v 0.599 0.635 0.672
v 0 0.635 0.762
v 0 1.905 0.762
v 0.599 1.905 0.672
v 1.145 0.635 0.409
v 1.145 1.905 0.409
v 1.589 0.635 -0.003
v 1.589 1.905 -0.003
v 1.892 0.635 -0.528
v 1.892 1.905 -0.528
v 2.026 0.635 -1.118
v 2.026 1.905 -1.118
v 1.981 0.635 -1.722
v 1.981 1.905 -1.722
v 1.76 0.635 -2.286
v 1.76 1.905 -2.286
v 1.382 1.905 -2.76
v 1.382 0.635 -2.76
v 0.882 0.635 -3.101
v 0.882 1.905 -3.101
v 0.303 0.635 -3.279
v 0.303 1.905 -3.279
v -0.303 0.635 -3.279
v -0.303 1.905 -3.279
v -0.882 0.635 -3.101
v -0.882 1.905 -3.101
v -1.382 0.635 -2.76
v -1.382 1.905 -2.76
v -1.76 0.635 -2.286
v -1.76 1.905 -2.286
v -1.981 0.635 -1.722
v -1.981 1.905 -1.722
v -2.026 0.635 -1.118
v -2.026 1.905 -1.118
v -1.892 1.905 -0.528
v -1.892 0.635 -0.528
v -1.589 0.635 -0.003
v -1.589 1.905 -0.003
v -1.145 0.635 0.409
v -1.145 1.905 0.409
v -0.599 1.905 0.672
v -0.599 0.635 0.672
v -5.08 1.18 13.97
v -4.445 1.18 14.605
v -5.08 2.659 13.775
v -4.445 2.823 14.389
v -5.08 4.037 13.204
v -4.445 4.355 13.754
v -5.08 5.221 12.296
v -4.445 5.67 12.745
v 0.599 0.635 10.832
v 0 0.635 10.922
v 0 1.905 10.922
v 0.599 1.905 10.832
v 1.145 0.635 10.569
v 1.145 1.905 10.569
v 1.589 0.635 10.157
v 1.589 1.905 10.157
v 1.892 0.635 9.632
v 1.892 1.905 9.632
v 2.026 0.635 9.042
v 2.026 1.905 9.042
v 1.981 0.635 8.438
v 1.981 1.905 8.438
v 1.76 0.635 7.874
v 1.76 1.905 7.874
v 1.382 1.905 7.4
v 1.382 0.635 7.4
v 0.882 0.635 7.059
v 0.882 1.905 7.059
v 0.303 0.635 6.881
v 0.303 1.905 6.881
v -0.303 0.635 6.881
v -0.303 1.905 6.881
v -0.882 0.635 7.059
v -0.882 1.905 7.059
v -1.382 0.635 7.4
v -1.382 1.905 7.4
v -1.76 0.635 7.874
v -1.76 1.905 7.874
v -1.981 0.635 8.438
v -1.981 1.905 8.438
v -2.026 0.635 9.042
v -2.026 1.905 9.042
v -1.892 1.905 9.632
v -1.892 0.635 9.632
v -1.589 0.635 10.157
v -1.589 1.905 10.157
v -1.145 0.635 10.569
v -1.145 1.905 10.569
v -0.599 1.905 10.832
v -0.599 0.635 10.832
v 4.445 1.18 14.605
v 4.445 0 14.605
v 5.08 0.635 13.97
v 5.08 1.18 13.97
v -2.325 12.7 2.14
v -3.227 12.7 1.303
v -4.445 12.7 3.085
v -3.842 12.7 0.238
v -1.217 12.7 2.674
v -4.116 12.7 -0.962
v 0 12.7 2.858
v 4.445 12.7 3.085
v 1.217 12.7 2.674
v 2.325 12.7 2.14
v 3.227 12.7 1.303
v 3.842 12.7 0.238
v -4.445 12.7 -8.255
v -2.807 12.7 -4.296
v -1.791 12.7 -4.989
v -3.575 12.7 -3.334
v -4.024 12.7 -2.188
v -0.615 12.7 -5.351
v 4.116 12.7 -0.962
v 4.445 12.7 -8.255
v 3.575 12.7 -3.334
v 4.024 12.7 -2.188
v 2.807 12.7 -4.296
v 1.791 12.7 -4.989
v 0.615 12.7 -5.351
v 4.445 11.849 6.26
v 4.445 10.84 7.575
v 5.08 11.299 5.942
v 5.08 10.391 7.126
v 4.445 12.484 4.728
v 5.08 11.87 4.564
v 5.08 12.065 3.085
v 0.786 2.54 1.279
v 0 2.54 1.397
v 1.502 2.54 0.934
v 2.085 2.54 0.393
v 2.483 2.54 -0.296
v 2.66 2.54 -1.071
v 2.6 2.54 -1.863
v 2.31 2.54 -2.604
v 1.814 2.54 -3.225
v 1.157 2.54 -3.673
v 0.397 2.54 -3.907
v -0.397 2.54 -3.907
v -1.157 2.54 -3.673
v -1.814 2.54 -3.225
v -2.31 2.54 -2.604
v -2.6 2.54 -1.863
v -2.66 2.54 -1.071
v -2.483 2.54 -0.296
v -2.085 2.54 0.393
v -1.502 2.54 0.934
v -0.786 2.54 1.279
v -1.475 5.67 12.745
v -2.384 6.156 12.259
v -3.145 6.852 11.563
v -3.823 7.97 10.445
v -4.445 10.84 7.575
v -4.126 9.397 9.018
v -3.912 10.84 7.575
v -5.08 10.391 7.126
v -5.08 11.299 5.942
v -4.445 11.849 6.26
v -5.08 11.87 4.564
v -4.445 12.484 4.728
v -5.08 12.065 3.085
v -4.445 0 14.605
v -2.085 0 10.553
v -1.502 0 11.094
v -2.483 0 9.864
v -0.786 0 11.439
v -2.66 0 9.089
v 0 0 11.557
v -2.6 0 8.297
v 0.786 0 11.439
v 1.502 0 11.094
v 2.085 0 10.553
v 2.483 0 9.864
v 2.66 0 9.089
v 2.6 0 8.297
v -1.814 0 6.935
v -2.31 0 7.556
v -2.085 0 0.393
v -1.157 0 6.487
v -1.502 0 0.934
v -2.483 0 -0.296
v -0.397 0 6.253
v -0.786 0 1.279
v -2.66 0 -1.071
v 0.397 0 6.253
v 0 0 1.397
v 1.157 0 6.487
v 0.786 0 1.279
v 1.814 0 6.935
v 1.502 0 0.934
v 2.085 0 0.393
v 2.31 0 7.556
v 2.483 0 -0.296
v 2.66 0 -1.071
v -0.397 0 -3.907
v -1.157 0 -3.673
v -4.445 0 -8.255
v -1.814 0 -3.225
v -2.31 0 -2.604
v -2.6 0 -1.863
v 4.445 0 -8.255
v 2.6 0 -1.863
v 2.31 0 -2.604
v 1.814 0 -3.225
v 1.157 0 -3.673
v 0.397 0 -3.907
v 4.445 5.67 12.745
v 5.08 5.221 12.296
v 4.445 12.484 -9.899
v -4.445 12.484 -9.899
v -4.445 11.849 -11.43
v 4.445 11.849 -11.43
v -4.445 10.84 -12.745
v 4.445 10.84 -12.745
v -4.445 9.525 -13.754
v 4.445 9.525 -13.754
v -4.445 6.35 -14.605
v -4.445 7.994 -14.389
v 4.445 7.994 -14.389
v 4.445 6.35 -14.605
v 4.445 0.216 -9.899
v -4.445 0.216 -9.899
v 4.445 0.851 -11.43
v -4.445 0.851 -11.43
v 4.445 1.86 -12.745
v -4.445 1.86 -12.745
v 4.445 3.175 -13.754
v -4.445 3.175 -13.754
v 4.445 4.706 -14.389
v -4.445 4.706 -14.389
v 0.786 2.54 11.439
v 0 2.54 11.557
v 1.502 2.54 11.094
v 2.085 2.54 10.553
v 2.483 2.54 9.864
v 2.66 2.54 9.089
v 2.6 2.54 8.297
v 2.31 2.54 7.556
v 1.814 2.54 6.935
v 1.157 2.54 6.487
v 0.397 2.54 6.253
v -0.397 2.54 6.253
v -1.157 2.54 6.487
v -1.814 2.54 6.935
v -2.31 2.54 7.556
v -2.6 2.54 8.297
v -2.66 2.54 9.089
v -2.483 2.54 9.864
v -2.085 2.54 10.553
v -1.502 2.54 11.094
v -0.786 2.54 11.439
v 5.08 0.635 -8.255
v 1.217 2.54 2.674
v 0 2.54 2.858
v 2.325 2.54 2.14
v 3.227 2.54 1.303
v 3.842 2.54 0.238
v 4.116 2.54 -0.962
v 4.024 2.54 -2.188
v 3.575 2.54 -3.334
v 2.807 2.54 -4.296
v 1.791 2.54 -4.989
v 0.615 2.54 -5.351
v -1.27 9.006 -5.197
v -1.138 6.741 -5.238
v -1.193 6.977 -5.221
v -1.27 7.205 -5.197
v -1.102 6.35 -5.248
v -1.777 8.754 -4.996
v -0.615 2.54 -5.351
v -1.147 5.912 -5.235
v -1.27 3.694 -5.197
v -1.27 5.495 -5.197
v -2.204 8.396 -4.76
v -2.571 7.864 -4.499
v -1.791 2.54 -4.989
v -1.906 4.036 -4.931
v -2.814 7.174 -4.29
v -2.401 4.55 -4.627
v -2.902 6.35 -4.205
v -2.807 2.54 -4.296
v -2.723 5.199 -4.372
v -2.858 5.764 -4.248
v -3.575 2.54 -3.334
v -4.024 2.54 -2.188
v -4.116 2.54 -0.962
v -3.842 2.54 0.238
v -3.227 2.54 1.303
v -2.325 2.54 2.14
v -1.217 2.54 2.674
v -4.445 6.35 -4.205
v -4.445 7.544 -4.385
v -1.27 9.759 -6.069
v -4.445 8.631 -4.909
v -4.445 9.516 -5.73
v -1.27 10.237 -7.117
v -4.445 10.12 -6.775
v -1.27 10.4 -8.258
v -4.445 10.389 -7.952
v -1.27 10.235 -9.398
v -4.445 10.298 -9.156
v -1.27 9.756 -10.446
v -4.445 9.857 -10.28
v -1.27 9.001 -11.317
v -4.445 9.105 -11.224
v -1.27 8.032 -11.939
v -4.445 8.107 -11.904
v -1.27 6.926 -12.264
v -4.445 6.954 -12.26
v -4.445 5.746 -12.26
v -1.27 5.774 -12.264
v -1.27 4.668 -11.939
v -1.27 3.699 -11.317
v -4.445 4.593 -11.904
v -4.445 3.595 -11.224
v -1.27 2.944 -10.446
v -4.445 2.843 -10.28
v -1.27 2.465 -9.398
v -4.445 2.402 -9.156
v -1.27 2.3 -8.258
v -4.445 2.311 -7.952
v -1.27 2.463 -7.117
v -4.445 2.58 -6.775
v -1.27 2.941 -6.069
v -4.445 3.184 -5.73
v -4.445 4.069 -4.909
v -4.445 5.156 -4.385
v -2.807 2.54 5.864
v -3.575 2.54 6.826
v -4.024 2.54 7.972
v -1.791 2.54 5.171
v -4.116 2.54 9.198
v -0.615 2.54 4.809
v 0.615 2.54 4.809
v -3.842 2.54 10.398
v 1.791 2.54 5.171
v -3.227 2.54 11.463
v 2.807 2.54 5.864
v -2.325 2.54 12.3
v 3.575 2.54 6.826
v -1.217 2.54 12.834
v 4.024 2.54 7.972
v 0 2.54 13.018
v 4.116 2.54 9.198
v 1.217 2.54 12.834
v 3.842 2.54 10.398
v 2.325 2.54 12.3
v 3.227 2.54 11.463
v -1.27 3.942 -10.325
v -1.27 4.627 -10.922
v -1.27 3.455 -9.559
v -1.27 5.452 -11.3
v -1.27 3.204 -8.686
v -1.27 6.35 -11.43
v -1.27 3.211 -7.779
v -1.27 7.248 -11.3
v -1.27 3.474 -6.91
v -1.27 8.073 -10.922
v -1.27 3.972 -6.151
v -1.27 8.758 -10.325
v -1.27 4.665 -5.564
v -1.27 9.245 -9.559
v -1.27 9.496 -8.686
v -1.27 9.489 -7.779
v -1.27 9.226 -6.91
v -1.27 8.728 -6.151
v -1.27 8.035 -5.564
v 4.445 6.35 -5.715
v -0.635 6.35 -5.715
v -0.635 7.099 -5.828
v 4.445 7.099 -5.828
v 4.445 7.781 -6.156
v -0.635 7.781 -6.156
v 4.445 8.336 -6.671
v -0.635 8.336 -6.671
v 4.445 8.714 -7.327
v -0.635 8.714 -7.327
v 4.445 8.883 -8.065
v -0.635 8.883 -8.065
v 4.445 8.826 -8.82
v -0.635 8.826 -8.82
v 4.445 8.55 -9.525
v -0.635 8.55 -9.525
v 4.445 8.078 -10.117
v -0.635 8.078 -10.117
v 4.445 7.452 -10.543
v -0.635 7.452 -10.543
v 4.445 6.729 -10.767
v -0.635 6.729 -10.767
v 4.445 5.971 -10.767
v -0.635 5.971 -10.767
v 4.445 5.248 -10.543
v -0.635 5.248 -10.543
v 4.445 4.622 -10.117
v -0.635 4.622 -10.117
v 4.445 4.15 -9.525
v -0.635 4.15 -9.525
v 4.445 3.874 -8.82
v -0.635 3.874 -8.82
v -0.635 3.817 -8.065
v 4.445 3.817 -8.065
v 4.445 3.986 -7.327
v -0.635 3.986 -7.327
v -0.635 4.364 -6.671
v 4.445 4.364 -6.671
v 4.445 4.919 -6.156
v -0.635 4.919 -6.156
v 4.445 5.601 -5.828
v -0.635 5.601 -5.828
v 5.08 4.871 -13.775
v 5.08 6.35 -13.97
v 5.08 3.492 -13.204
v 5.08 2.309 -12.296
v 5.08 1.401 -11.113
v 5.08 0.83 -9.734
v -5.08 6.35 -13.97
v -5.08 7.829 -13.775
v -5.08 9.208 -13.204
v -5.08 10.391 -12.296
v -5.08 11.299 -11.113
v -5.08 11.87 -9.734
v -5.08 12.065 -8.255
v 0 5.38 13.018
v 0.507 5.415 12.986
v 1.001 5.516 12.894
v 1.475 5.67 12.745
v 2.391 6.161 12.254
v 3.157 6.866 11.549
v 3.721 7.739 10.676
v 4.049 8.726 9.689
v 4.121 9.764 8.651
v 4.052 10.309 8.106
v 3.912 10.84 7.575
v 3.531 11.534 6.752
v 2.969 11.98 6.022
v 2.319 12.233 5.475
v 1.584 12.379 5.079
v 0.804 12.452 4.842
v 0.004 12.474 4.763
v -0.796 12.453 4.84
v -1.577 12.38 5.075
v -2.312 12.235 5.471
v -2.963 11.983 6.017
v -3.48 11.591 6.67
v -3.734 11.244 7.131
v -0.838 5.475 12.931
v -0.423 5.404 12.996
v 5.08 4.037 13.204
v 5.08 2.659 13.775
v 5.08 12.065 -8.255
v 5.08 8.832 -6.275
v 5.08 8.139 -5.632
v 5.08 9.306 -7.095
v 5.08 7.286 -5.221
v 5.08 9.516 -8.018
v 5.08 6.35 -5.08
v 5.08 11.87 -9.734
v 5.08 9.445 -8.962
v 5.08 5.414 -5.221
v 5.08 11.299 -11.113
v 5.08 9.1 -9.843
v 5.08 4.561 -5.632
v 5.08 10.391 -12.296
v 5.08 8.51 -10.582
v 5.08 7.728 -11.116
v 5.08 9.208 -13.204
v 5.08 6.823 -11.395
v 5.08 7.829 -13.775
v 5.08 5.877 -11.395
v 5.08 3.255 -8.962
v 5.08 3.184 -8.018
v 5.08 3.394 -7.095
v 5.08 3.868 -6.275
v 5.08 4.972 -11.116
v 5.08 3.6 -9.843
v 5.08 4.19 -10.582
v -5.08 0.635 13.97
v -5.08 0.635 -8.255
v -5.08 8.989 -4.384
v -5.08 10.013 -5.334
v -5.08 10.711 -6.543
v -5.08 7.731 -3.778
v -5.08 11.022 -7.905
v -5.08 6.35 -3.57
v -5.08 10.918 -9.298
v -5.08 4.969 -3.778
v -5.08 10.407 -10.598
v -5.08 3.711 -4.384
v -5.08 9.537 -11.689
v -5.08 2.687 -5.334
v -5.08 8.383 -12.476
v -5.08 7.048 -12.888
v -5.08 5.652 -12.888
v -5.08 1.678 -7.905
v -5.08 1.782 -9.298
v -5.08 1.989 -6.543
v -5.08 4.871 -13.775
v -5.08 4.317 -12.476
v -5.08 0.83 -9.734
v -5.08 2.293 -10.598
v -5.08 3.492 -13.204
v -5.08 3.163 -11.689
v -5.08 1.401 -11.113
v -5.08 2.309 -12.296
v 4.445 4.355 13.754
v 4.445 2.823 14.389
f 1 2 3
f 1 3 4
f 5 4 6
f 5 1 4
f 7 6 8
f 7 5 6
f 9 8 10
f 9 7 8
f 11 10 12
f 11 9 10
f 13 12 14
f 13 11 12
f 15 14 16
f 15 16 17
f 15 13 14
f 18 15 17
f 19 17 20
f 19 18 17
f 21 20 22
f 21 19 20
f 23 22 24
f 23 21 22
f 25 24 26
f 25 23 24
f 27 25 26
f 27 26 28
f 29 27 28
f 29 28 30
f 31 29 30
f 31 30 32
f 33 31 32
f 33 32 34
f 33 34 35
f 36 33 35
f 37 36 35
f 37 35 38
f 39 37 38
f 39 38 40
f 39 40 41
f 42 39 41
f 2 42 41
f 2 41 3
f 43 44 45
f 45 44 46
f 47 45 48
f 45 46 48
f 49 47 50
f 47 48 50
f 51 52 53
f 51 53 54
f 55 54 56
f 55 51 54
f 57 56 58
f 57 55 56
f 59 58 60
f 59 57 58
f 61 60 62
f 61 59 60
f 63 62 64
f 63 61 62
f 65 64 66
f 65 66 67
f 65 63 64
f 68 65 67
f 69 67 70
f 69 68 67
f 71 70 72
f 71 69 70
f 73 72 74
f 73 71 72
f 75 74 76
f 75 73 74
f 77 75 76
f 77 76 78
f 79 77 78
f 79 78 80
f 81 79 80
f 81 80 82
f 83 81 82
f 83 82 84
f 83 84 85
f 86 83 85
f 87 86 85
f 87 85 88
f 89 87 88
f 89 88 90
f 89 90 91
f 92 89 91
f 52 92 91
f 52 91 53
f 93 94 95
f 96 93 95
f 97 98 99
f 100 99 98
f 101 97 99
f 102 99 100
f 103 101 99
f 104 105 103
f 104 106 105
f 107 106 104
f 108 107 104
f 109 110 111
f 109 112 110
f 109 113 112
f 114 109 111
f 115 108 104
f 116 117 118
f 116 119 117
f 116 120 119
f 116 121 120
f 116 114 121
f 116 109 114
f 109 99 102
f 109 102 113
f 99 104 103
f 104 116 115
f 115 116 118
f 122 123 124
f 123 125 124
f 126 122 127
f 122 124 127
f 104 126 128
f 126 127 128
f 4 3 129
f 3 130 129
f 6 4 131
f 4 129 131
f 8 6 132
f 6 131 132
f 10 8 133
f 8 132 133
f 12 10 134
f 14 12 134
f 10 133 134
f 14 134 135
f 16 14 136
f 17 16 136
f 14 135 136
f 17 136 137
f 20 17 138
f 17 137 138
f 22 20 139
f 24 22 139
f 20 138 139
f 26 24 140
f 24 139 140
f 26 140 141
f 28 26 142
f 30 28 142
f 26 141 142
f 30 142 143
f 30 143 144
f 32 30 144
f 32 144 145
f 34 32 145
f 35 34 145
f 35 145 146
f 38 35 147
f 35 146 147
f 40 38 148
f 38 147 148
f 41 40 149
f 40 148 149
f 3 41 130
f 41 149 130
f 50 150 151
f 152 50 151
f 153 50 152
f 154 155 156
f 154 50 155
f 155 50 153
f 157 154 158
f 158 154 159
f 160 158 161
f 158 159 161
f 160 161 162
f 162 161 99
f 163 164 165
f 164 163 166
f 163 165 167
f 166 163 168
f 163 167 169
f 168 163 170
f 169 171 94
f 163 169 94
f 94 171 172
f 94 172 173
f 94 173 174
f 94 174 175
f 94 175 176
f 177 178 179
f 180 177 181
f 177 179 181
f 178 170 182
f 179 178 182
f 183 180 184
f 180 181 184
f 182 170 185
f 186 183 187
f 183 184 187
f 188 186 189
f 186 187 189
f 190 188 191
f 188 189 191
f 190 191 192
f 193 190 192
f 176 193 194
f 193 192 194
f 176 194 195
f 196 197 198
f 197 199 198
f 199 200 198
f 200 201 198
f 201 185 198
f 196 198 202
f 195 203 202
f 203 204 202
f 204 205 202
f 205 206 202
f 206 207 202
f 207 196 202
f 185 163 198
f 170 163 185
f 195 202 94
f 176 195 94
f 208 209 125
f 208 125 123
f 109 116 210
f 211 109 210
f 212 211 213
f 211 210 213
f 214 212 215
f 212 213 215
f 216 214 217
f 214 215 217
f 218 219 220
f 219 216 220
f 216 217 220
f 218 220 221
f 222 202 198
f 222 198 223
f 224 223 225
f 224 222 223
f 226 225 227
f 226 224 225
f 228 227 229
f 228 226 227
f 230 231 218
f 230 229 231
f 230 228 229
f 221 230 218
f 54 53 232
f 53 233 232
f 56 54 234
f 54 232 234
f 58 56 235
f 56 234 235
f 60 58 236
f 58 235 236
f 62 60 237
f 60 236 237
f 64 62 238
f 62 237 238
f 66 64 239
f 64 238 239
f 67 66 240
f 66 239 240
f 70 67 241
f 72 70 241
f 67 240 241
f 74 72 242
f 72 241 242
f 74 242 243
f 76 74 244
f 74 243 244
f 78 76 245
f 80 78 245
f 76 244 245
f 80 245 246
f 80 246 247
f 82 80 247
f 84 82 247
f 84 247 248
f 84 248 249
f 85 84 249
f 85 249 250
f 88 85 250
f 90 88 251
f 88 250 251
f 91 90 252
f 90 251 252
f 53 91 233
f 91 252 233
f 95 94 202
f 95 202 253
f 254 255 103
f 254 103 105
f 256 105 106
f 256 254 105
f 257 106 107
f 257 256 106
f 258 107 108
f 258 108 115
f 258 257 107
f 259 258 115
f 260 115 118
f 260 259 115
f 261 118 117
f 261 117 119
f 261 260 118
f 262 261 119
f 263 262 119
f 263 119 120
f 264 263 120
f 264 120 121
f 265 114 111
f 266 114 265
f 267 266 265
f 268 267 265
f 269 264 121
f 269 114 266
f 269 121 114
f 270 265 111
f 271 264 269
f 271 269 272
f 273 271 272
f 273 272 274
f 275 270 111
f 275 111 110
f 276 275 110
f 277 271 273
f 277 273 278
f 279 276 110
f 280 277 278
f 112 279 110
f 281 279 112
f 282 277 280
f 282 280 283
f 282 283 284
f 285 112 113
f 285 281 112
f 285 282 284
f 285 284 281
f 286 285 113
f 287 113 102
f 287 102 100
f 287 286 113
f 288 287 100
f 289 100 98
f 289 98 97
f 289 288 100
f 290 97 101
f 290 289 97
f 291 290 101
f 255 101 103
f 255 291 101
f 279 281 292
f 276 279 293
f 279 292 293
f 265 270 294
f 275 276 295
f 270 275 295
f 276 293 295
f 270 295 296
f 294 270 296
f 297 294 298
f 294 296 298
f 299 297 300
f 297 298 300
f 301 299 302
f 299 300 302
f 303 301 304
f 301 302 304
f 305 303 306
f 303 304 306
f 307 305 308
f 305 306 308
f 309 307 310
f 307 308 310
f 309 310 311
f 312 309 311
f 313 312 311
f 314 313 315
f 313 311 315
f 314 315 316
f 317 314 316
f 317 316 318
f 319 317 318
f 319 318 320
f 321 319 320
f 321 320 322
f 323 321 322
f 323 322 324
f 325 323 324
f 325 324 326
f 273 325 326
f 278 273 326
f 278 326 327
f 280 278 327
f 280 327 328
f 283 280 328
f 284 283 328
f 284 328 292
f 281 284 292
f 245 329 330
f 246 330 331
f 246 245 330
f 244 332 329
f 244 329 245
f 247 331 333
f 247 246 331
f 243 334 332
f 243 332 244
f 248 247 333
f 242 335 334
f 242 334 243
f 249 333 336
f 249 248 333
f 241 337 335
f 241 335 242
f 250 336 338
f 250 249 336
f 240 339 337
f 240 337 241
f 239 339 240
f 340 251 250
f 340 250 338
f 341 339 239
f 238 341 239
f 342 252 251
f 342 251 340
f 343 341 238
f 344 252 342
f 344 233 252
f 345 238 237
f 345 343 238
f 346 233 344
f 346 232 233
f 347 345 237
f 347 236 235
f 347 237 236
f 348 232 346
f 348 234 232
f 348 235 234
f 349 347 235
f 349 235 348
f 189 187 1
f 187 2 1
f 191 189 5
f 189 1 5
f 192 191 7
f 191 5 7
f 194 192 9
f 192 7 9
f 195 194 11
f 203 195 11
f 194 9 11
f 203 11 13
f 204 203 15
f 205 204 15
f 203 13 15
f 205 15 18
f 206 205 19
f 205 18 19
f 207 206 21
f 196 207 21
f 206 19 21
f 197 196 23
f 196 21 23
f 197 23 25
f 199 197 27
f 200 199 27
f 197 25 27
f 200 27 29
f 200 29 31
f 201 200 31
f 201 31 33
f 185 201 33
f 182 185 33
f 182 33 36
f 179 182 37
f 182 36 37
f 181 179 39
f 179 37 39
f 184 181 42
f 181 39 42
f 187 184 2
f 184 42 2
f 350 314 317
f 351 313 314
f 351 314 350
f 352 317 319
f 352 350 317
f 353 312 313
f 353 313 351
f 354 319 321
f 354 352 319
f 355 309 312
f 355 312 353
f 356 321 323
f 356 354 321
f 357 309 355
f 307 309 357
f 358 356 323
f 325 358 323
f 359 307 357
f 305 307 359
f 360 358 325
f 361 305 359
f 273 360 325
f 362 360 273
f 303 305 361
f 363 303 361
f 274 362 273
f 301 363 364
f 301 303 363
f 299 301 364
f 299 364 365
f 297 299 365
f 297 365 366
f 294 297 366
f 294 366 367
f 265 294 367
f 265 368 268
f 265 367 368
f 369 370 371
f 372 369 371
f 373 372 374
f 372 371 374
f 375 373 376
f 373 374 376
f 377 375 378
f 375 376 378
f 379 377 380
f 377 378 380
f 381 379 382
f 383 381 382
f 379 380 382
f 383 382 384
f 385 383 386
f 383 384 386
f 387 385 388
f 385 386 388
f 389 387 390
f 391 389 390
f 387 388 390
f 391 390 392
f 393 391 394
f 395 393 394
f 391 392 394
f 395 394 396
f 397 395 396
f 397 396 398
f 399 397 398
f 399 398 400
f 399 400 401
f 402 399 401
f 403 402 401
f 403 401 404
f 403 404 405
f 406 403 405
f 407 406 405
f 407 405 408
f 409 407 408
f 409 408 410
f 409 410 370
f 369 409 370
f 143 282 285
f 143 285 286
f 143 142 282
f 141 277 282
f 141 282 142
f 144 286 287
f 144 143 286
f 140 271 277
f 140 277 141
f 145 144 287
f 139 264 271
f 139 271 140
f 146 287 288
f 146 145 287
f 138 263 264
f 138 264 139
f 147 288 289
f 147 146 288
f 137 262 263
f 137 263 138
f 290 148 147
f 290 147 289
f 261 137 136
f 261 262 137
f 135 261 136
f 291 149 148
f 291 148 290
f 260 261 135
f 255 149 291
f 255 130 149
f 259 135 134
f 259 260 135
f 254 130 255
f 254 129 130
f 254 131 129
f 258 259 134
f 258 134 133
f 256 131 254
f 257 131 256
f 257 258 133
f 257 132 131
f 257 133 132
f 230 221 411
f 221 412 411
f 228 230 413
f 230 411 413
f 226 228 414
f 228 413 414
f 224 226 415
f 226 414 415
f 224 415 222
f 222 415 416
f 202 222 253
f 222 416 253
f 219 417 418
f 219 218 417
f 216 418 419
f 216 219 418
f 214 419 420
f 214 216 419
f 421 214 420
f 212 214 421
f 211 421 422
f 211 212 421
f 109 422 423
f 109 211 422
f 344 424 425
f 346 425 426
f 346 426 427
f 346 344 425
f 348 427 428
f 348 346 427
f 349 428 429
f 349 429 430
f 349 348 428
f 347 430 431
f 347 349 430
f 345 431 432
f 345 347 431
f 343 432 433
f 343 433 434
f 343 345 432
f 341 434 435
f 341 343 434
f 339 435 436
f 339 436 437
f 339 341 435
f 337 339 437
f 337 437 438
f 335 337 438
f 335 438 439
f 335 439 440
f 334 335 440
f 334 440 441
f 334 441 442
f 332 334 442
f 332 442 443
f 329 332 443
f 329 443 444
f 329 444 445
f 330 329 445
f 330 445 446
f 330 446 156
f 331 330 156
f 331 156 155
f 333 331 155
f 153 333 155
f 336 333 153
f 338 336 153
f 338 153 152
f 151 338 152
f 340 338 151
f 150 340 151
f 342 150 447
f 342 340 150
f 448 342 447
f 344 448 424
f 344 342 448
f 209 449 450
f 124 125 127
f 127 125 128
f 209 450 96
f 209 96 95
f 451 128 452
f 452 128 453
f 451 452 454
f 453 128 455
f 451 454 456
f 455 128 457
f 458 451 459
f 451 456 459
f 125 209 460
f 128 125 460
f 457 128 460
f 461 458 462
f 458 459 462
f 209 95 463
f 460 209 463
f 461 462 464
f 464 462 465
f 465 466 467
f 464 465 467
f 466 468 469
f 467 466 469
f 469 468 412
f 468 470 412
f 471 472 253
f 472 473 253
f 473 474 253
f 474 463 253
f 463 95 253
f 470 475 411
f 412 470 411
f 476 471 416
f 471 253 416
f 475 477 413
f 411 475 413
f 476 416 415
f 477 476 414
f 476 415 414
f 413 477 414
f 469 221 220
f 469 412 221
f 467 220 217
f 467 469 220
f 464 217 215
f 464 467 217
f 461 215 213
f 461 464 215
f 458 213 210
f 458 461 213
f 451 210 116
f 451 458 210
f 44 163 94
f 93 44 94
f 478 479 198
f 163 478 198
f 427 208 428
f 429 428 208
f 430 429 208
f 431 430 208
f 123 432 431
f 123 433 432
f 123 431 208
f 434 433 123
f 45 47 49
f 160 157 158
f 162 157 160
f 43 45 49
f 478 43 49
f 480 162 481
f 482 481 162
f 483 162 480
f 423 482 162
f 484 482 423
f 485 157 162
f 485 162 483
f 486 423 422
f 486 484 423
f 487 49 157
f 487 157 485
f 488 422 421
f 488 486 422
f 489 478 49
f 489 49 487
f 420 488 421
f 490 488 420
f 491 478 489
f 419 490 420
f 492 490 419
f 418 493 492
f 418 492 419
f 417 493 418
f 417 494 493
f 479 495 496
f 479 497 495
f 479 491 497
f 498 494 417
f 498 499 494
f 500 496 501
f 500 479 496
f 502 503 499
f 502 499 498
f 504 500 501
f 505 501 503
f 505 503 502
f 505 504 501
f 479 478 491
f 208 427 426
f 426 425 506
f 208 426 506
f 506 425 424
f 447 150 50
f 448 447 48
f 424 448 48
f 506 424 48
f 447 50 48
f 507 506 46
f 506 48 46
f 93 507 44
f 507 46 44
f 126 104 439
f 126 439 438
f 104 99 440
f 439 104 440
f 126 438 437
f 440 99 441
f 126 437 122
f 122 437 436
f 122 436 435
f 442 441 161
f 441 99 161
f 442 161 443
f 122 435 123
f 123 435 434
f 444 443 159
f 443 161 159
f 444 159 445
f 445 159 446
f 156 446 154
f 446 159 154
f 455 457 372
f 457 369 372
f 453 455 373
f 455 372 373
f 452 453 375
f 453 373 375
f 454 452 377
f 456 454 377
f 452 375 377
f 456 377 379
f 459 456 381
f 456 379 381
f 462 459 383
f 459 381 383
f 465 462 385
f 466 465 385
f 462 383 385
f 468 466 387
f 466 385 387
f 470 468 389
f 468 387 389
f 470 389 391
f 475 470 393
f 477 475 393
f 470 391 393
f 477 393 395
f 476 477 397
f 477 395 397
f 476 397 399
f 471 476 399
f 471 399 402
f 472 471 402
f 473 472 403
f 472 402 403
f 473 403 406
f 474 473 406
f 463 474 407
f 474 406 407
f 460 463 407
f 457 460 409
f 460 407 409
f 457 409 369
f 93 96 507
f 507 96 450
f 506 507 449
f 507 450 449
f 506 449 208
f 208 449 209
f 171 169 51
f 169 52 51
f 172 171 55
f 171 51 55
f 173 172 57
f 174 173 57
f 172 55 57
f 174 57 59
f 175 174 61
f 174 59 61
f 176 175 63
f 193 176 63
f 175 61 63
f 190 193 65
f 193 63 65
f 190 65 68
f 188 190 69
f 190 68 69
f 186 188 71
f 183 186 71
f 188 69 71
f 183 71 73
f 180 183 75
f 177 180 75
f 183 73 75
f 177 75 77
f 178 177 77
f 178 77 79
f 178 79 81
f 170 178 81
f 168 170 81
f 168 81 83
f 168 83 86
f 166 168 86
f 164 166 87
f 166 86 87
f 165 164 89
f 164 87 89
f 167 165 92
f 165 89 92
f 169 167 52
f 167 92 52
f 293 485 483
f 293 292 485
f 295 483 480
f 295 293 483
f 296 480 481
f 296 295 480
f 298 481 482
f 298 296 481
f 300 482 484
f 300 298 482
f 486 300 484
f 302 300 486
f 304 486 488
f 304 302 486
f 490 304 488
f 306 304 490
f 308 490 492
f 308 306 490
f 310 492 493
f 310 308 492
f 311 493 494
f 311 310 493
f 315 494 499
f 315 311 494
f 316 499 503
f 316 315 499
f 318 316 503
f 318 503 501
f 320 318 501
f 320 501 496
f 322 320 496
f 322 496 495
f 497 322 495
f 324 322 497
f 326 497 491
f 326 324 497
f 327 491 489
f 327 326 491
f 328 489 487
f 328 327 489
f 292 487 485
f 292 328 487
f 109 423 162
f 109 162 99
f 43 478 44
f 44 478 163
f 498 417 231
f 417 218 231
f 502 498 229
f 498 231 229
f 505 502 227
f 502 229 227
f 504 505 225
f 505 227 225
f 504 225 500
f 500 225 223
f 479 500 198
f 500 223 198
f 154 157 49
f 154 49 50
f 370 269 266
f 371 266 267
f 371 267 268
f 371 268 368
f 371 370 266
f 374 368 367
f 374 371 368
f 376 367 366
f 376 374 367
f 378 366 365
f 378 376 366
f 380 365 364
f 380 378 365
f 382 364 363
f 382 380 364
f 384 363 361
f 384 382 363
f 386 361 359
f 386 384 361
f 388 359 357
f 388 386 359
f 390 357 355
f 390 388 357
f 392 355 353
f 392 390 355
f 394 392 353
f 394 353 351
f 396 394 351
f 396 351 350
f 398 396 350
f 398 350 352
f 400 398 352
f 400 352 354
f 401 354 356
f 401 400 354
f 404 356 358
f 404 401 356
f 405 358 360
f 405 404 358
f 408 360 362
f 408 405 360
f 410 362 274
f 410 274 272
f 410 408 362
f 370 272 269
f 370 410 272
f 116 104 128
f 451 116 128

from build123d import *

# Parameters (mm, degrees)
SKETCH1_W           = 10.16
SKETCH1_H           = 29.21
SKETCH1_R           = 2.032
SKETCH1_R_2         = 4.1275
BOSS_EXTRUDE1_DEPTH = 12.7
SKETCH1_3_R         = 2.032
CUT_EXTRUDE2_DEPTH  = 21.010058096
CUT_EXTRUDE3_START  = 2.54
SKETCH1_4_R         = 4.1275
SKETCH1_4_R_2       = 2.032
CUT_EXTRUDE3_DEPTH  = 10.16
SKETCH2_R           = 4.05
CUT_EXTRUDE1_DEPTH  = 3.81
SKETCH3_R           = 2.54
CUT_EXTRUDE4_DEPTH  = 22.859131445
CHAMFER1_SIZE       = 8.89
FILLET1_R           = 6.35
FILLET2_R           = 6.35
CHAMFER2_SIZE       = 0.635


# Some blends are built 0.0001 mm under size
with BuildPart() as part:
    # Sketch1 → Boss-Extrude1 (new body)
    # profile 1 of 5: a face of its own
    with BuildSketch(Plane(origin=(0, 0, 0), x_dir=(1, 0, 0), z_dir=(0, 1, 0))):
        Rectangle(SKETCH1_W, SKETCH1_H)
        with Locations((0, -8.89)):
            Circle(SKETCH1_R, mode=Mode.SUBTRACT)
        with Locations((0, 1.27)):
            Circle(SKETCH1_R, mode=Mode.SUBTRACT)
    # profile 2 of 5: a face of its own
    with BuildSketch(Plane(origin=(0, 0, 0), x_dir=(1, 0, 0), z_dir=(0, 1, 0))):
        with Locations((0, 1.27)):
            Circle(SKETCH1_R_2)
        with Locations((0, 1.27)):
            Circle(SKETCH1_R, mode=Mode.SUBTRACT)
    # profile 3 of 5: a face of its own
    with BuildSketch(Plane(origin=(0, 0, 0), x_dir=(1, 0, 0), z_dir=(0, 1, 0))):
        with Locations((0, 1.27)):
            Circle(SKETCH1_R)
    # profile 4 of 5: a face of its own
    with BuildSketch(Plane(origin=(0, 0, 0), x_dir=(1, 0, 0), z_dir=(0, 1, 0))):
        with Locations((0, -8.89)):
            Circle(SKETCH1_R_2)
        with Locations((0, -8.89)):
            Circle(SKETCH1_R, mode=Mode.SUBTRACT)
    # profile 5 of 5: a face of its own
    with BuildSketch(Plane(origin=(0, 0, 0), x_dir=(1, 0, 0), z_dir=(0, 1, 0))):
        with Locations((0, -8.89)):
            Circle(SKETCH1_R)
    extrude(amount=BOSS_EXTRUDE1_DEPTH)

    # Sketch1<3> → Cut-Extrude2 (cut, through all)
    with BuildSketch(Plane(origin=(0, 0, 0), x_dir=(1, 0, 0), z_dir=(0, 1, 0))):
        with Locations(Location((0, 1.27, 0), (0, 0, 270))):
            Circle(SKETCH1_3_R)
        with Locations(Location((0, -8.89, 0), (0, 0, 270))):
            Circle(SKETCH1_3_R)
    extrude(amount=CUT_EXTRUDE2_DEPTH, mode=Mode.SUBTRACT)

    # Sketch1<4> → Cut-Extrude3 (cut)
    # profile 1 of 2: a face of its own
    with BuildSketch(Plane(origin=(0, 0, 0), x_dir=(1, 0, 0), z_dir=(0, 1, 0)).offset(CUT_EXTRUDE3_START)):
        with Locations(Location((0, -8.89, 0), (0, 0, 270))):
            Circle(SKETCH1_4_R)
        with Locations(Location((0, -8.89, 0), (0, 0, 270))):
            Circle(SKETCH1_4_R_2, mode=Mode.SUBTRACT)
    # profile 2 of 2: a face of its own
    with BuildSketch(Plane(origin=(0, 0, 0), x_dir=(1, 0, 0), z_dir=(0, 1, 0)).offset(CUT_EXTRUDE3_START)):
        with Locations(Location((0, 1.27, 0), (0, 0, 270))):
            Circle(SKETCH1_4_R)
        with Locations(Location((0, 1.27, 0), (0, 0, 270))):
            Circle(SKETCH1_4_R_2, mode=Mode.SUBTRACT)
    extrude(amount=CUT_EXTRUDE3_DEPTH, mode=Mode.SUBTRACT)

    # Sketch2 → Cut-Extrude1 (cut)
    with BuildSketch(Plane.ZY.offset(5.08)):
        with Locations((-8.255, 6.35)):
            Circle(SKETCH2_R)
    extrude(amount=-CUT_EXTRUDE1_DEPTH, mode=Mode.SUBTRACT)

    # Sketch3 → Cut-Extrude4 (cut, through all)
    with BuildSketch(Plane.ZY.offset(5.08)):
        with Locations((-8.255, 6.35)):
            Circle(SKETCH3_R)
    extrude(amount=-CUT_EXTRUDE4_DEPTH, mode=Mode.SUBTRACT)

    # Chamfer1
    # the kernel refuses this chamfer: 8.89 mm, written as the material it takes off along each edge
    with BuildSketch(Plane(origin=(-27.942261763, 12.7, 14.605), x_dir=(0, -0.9996219169112966, 0.027495876610586317), z_dir=(1, 0, 0))) as chamfer1_piece_1:
        Polygon((CHAMFER1_SIZE * 0.999621916911, CHAMFER1_SIZE * 0.0274958766106), (-CHAMFER1_SIZE * 0.0274958766106, CHAMFER1_SIZE * 0.999621916911), (0, 0), align=None)
    extrude(amount=55.884523526, mode=Mode.SUBTRACT)

    # Fillet1
    # the kernel refuses this fillet: 6.35 mm, written as the material it takes off along each edge
    with BuildSketch(Plane(origin=(-11.655640303, 3.81, 14.605), x_dir=(0, -1, 0), z_dir=(1, 0, 0))) as fillet1_piece_1:
        with BuildLine():
            CenterArc((FILLET1_R * 0.414213562373, FILLET1_R), FILLET1_R, 225, 45)
            Line((-FILLET1_R * 0.292893218814, FILLET1_R * 0.292893218814), (0, 0))
            Line((0, 0), (FILLET1_R * 0.414213562373, 0))
        make_face()
    extrude(amount=23.311280605, mode=Mode.SUBTRACT)
    with BuildSketch(Plane(origin=(-11.655640303, 12.7, 5.715), x_dir=(0, -0.7071067811862649, 0.7071067811868301), z_dir=(1, 0, 0)), Plane(origin=(-3.938287226, 12.7, 5.715), x_dir=(0, -0.7071067811862649, 0.7071067811868301), z_dir=(1, 0, 0))) as fillet1_piece_2:
        with BuildLine():
            CenterArc((FILLET1_R * 0.414213562373, FILLET1_R), FILLET1_R, 225, 45)
            Line((-FILLET1_R * 0.292893218813, FILLET1_R * 0.292893218813), (0, 0))
            Line((0, 0), (FILLET1_R * 0.414213562373, 0))
        make_face()
    extrude(amount=15.593927529, mode=Mode.SUBTRACT)

    # Fillet2
    fillet2_edges = [part.edges().sort_by_distance(p)[0] for p in [
        (0, 12.7, -14.605),
        (0, 0, -14.605),
    ]]
    fillet(fillet2_edges, radius=FILLET2_R - 0.0001)  # a hair under: the kernel refuses the full size

    # Chamfer2
    # the kernel refuses this chamfer: 0.635 mm, written as the material it takes off along each edge
    with BuildSketch(Plane(origin=(0, 0, -1.27), x_dir=(0, 0, 1), z_dir=(-1, 0, 0))) as chamfer2_piece_1:
        Polygon((2.032 + CHAMFER2_SIZE, 0), (2.032, CHAMFER2_SIZE), (2.032, 0), align=None)
    revolve(axis=Axis((0, 0, -1.27), (0, 1, 0)), mode=Mode.SUBTRACT)
    with BuildSketch(Plane(origin=(0, 0, 8.89), x_dir=(0, 0, 1), z_dir=(-1, 0, 0))) as chamfer2_piece_2:
        Polygon((2.032 + CHAMFER2_SIZE, 0), (2.032, CHAMFER2_SIZE), (2.032, 0), align=None)
    revolve(axis=Axis((0, 0, 8.89), (0, 1, 0)), mode=Mode.SUBTRACT)
    with BuildSketch(Plane(origin=(0, 2.54, 8.89), x_dir=(0, 0, 1), z_dir=(-1, 0, 0))) as chamfer2_piece_3:
        Polygon((2.032, -CHAMFER2_SIZE), (2.032 + CHAMFER2_SIZE, 0), (2.032, 0), align=None)
    revolve(axis=Axis((0, 2.54, 8.89), (0, 1, 0)), mode=Mode.SUBTRACT)
    with BuildSketch(Plane(origin=(0, 2.54, -1.27), x_dir=(0, 0, 1), z_dir=(-1, 0, 0))) as chamfer2_piece_4:
        Polygon((2.032, -CHAMFER2_SIZE), (2.032 + CHAMFER2_SIZE, 0), (2.032, 0), align=None)
    revolve(axis=Axis((0, 2.54, -1.27), (0, 1, 0)), mode=Mode.SUBTRACT)
    with BuildSketch(Plane(origin=(-5.08, 6.35, -8.255), x_dir=(0, 0, 1), z_dir=(0, -1, 0))) as chamfer2_piece_5:
        Polygon((4.05 + CHAMFER2_SIZE, 0), (4.05, -CHAMFER2_SIZE), (4.05, 0), align=None)
    revolve(axis=Axis((-5.08, 6.35, -8.255), (-1, 0, 0)), mode=Mode.SUBTRACT)
    with BuildSketch(Plane(origin=(-1.27, 6.35, -8.255), x_dir=(0, 0, 1), z_dir=(0, -1, 0))) as chamfer2_piece_6:
        Polygon((2.54 + CHAMFER2_SIZE, 0), (2.54, -CHAMFER2_SIZE), (2.54, 0), align=None)
    revolve(axis=Axis((-1.27, 6.35, -8.255), (-1, 0, 0)), mode=Mode.SUBTRACT)
    with BuildSketch(Plane(origin=(5.08, 6.35, -8.255), x_dir=(0, 0, 1), z_dir=(0, -1, 0))) as chamfer2_piece_7:
        Polygon((2.54 + CHAMFER2_SIZE, 0), (2.54, CHAMFER2_SIZE), (2.54, 0), align=None)
    revolve(axis=Axis((5.08, 6.35, -8.255), (-1, 0, 0)), mode=Mode.SUBTRACT)
    with BuildSketch(Plane(origin=(-5.08, 0, -8.2551), x_dir=(-0.027495876610585925, 0.9996219169112968, 0), z_dir=(0, 0, 1))) as chamfer2_piece_8:
        Polygon((CHAMFER2_SIZE * 0.999621916911, -CHAMFER2_SIZE * 0.0274958766106), (-CHAMFER2_SIZE * 0.0274958766106, -CHAMFER2_SIZE * 0.999621916911), (0, 0), align=None)
    extrude(amount=24.493118697, mode=Mode.SUBTRACT)
    with BuildSketch(Plane(origin=(5.08, -1.633018697, 14.605), x_dir=(-0.9996219169112966, 0, 0.027495876610587302), z_dir=(0, 1, 0)), Plane(origin=(-5.08, -1.633018697, 14.605), x_dir=(-0.027495876610585834, 0, -0.9996219169112968), z_dir=(0, 1, 0))) as chamfer2_piece_9:
        Polygon((CHAMFER2_SIZE * 0.999621916911, -CHAMFER2_SIZE * 0.0274958766106), (-CHAMFER2_SIZE * 0.0274958766106, -CHAMFER2_SIZE * 0.999621916911), (0, 0), align=None)
    extrude(amount=2.812762576, mode=Mode.SUBTRACT)
    with BuildSketch(Plane(origin=(-5.08, 10.840128061, 7.574871939), x_dir=(-0.027495876610587233, -0.706839436070956, -0.7068394360703909), z_dir=(0, -0.7071067811862648, 0.7071067811868302)), Plane(origin=(5.08, 5.669871939, 12.745128061), x_dir=(0.02749587661058726, -0.7068394360709561, -0.7068394360703909), z_dir=(0, 0.7071067811862648, -0.7071067811868302))) as chamfer2_piece_10:
        Polygon((CHAMFER2_SIZE * 0.999621916911, CHAMFER2_SIZE * 0.0274958766106), (-CHAMFER2_SIZE * 0.0274958766106, CHAMFER2_SIZE * 0.999621916911), (0, 0), align=None)
    extrude(amount=7.311846327, mode=Mode.SUBTRACT)
    with BuildSketch(Plane(origin=(-5.08, 12.7, -8.2551), x_dir=(-0.02749587661058591, -0.9996219169112968, 0), z_dir=(0, 0, 1))) as chamfer2_piece_11:
        Polygon((CHAMFER2_SIZE * 0.999621916911, CHAMFER2_SIZE * 0.0274958766106), (-CHAMFER2_SIZE * 0.0274958766106, CHAMFER2_SIZE * 0.999621916911), (0, 0), align=None)
    extrude(amount=11.339843879, mode=Mode.SUBTRACT)
    with BuildSketch(Plane(origin=(-5.08, 6.35, 3.084743879), x_dir=(0, 0.7071067811870476, 0.7071067811860474), z_dir=(0, -0.7071067811860474, 0.7071067811870476))) as chamfer2_piece_12:
        Polygon((6.35 - CHAMFER2_SIZE, 0), (6.35, -CHAMFER2_SIZE), (6.35, 0), align=None)
    revolve(axis=Axis((-5.08, 6.35, 3.084743879), (-1, 0, 0)), revolution_arc=45, mode=Mode.SUBTRACT)
    with BuildSketch(Plane(origin=(5.08, 0, 16.238018697), x_dir=(-0.9996219169112966, -0.0274958766105864, 0), z_dir=(0, 0, -1))) as chamfer2_piece_13:
        Polygon((CHAMFER2_SIZE * 0.999621916911, CHAMFER2_SIZE * 0.0274958766106), (-CHAMFER2_SIZE * 0.0274958766106, CHAMFER2_SIZE * 0.999621916911), (0, 0), align=None)
    extrude(amount=24.493118697, mode=Mode.SUBTRACT)
    with BuildSketch(Plane(origin=(-5.08, 1.179743879, 8.255), x_dir=(0, 0, 1), z_dir=(0, -1, 0))) as chamfer2_piece_14:
        Polygon((6.35 - CHAMFER2_SIZE, 0), (6.35, -CHAMFER2_SIZE), (6.35, 0), align=None)
    revolve(axis=Axis((-5.08, 1.179743879, 8.255), (-1, 0, 0)), revolution_arc=45, mode=Mode.SUBTRACT)
    with BuildSketch(Plane(origin=(5.08, 12.7, 3.084743879), x_dir=(-0.9996219169112966, 0.027495876610587302, 0), z_dir=(0, 0, -1))) as chamfer2_piece_15:
        Polygon((CHAMFER2_SIZE * 0.999621916911, -CHAMFER2_SIZE * 0.0274958766106), (-CHAMFER2_SIZE * 0.0274958766106, -CHAMFER2_SIZE * 0.999621916911), (0, 0), align=None)
    extrude(amount=11.339843879, mode=Mode.SUBTRACT)
    with BuildSketch(Plane(origin=(5.08, 6.35, 3.084743879), x_dir=(0, 0.7071067811870476, 0.7071067811860474), z_dir=(0, -0.7071067811860474, 0.7071067811870476))) as chamfer2_piece_16:
        Polygon((6.35, CHAMFER2_SIZE), (6.35 - CHAMFER2_SIZE, 0), (6.35, 0), align=None)
    revolve(axis=Axis((5.08, 6.35, 3.084743879), (-1, 0, 0)), revolution_arc=45, mode=Mode.SUBTRACT)
    with BuildSketch(Plane(origin=(5.08, 1.179743879, 8.255), x_dir=(0, 0, 1), z_dir=(0, -1, 0))) as chamfer2_piece_17:
        Polygon((6.35, CHAMFER2_SIZE), (6.35 - CHAMFER2_SIZE, 0), (6.35, 0), align=None)
    revolve(axis=Axis((5.08, 1.179743879, 8.255), (-1, 0, 0)), revolution_arc=45, mode=Mode.SUBTRACT)
    with BuildSketch(Plane(origin=(5.08, 6.3501, -8.2551), x_dir=(0, 0, -1), z_dir=(0, -1, 0))) as chamfer2_piece_18:
        Polygon((6.3499, -CHAMFER2_SIZE), (6.3499 - CHAMFER2_SIZE, 0), (6.3499, 0), align=None)
    revolve(axis=Axis((5.08, 6.3501, -8.2551), (1, 0, 0)), revolution_arc=90, mode=Mode.SUBTRACT)
    with BuildSketch(Plane(origin=(5.08, 6.3499, -8.2551), x_dir=(0, 0, -1), z_dir=(0, 1, 0))) as chamfer2_piece_19:
        Polygon((6.3499, CHAMFER2_SIZE), (6.3499 - CHAMFER2_SIZE, 0), (6.3499, 0), align=None)
    revolve(axis=Axis((5.08, 6.3499, -8.2551), (-1, 0, 0)), revolution_arc=90, mode=Mode.SUBTRACT)
    with BuildSketch(Plane(origin=(-5.08, 6.3501, -8.2551), x_dir=(0, 0, -1), z_dir=(0, -1, 0))) as chamfer2_piece_20:
        Polygon((6.3499 - CHAMFER2_SIZE, 0), (6.3499, CHAMFER2_SIZE), (6.3499, 0), align=None)
    revolve(axis=Axis((-5.08, 6.3501, -8.2551), (1, 0, 0)), revolution_arc=90, mode=Mode.SUBTRACT)
    with BuildSketch(Plane(origin=(-5.08, 6.3499, -8.2551), x_dir=(0, 0, -1), z_dir=(0, 1, 0))) as chamfer2_piece_21:
        Polygon((6.3499 - CHAMFER2_SIZE, 0), (6.3499, -CHAMFER2_SIZE), (6.3499, 0), align=None)
    revolve(axis=Axis((-5.08, 6.3499, -8.2551), (-1, 0, 0)), revolution_arc=90, mode=Mode.SUBTRACT)
    with BuildSketch(Plane(origin=(-5.08, 6.3499, -14.605), x_dir=(-0.02749587661058591, 0, 0.9996219169112968), z_dir=(0, 1, 0)), Plane(origin=(5.08, 6.3499, -14.605), x_dir=(-0.9996219169112966, 0, -0.027495876610587302), z_dir=(0, 1, 0))) as chamfer2_piece_22:
        Polygon((CHAMFER2_SIZE * 0.999621916911, CHAMFER2_SIZE * 0.0274958766106), (-CHAMFER2_SIZE * 0.0274958766106, CHAMFER2_SIZE * 0.999621916911), (0, 0), align=None)
    extrude(amount=0.0002, mode=Mode.SUBTRACT)


solid = part.part
